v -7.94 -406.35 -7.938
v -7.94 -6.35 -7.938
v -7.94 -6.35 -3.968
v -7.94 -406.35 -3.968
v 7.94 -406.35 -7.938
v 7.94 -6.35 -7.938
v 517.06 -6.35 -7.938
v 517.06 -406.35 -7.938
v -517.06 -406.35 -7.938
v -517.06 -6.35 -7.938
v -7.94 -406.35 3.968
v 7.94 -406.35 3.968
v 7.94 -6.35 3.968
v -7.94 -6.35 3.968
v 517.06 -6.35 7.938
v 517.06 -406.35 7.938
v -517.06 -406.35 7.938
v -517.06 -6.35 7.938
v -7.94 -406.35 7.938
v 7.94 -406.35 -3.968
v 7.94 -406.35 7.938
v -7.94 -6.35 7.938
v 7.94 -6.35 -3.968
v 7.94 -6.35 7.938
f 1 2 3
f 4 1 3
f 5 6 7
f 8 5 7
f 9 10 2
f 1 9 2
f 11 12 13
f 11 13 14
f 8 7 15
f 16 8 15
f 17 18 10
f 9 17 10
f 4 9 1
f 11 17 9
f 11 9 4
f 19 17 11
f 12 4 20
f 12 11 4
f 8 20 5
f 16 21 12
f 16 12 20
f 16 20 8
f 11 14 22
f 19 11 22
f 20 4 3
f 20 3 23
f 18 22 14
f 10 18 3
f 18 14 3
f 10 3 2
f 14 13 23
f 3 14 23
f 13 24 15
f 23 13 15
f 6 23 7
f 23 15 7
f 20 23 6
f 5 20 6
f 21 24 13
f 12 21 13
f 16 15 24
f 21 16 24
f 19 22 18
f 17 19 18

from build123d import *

# Parameters (mm, degrees)
F1_DEPTH = 406.35
F2_W     = 6.35
F2_H     = 7.9532051459
F3_DEPTH = 525


with BuildPart() as f1:
    # F0 (on Front) → F1 (new body)
    with BuildSketch(Plane.XZ):
        Polygon((517.06, 0), (517.06, 7.9375), (7.94, 7.9375), (7.94, 3.9675), (-7.94, 3.9675), (-7.94, 7.9375), (-517.06, 7.9375), (-517.06, 0), (-517.06, -7.9375), (-7.94, -7.9375), (-7.94, -3.9675), (7.94, -3.9675), (7.94, -7.9375), (517.06, -7.9375), align=None)
    extrude(amount=F1_DEPTH)

    # F2 (on Right) → F3 (cut, symmetric)
    with BuildSketch(Plane.YZ):
        with Locations((-3.175, -3.9766025729)):
            Rectangle(F2_W, F2_H)
        with Locations((-3.175, 3.9766025729)):
            Rectangle(F2_W, F2_H)
    extrude(amount=F3_DEPTH, both=True, mode=Mode.SUBTRACT)


solid = f1.part
